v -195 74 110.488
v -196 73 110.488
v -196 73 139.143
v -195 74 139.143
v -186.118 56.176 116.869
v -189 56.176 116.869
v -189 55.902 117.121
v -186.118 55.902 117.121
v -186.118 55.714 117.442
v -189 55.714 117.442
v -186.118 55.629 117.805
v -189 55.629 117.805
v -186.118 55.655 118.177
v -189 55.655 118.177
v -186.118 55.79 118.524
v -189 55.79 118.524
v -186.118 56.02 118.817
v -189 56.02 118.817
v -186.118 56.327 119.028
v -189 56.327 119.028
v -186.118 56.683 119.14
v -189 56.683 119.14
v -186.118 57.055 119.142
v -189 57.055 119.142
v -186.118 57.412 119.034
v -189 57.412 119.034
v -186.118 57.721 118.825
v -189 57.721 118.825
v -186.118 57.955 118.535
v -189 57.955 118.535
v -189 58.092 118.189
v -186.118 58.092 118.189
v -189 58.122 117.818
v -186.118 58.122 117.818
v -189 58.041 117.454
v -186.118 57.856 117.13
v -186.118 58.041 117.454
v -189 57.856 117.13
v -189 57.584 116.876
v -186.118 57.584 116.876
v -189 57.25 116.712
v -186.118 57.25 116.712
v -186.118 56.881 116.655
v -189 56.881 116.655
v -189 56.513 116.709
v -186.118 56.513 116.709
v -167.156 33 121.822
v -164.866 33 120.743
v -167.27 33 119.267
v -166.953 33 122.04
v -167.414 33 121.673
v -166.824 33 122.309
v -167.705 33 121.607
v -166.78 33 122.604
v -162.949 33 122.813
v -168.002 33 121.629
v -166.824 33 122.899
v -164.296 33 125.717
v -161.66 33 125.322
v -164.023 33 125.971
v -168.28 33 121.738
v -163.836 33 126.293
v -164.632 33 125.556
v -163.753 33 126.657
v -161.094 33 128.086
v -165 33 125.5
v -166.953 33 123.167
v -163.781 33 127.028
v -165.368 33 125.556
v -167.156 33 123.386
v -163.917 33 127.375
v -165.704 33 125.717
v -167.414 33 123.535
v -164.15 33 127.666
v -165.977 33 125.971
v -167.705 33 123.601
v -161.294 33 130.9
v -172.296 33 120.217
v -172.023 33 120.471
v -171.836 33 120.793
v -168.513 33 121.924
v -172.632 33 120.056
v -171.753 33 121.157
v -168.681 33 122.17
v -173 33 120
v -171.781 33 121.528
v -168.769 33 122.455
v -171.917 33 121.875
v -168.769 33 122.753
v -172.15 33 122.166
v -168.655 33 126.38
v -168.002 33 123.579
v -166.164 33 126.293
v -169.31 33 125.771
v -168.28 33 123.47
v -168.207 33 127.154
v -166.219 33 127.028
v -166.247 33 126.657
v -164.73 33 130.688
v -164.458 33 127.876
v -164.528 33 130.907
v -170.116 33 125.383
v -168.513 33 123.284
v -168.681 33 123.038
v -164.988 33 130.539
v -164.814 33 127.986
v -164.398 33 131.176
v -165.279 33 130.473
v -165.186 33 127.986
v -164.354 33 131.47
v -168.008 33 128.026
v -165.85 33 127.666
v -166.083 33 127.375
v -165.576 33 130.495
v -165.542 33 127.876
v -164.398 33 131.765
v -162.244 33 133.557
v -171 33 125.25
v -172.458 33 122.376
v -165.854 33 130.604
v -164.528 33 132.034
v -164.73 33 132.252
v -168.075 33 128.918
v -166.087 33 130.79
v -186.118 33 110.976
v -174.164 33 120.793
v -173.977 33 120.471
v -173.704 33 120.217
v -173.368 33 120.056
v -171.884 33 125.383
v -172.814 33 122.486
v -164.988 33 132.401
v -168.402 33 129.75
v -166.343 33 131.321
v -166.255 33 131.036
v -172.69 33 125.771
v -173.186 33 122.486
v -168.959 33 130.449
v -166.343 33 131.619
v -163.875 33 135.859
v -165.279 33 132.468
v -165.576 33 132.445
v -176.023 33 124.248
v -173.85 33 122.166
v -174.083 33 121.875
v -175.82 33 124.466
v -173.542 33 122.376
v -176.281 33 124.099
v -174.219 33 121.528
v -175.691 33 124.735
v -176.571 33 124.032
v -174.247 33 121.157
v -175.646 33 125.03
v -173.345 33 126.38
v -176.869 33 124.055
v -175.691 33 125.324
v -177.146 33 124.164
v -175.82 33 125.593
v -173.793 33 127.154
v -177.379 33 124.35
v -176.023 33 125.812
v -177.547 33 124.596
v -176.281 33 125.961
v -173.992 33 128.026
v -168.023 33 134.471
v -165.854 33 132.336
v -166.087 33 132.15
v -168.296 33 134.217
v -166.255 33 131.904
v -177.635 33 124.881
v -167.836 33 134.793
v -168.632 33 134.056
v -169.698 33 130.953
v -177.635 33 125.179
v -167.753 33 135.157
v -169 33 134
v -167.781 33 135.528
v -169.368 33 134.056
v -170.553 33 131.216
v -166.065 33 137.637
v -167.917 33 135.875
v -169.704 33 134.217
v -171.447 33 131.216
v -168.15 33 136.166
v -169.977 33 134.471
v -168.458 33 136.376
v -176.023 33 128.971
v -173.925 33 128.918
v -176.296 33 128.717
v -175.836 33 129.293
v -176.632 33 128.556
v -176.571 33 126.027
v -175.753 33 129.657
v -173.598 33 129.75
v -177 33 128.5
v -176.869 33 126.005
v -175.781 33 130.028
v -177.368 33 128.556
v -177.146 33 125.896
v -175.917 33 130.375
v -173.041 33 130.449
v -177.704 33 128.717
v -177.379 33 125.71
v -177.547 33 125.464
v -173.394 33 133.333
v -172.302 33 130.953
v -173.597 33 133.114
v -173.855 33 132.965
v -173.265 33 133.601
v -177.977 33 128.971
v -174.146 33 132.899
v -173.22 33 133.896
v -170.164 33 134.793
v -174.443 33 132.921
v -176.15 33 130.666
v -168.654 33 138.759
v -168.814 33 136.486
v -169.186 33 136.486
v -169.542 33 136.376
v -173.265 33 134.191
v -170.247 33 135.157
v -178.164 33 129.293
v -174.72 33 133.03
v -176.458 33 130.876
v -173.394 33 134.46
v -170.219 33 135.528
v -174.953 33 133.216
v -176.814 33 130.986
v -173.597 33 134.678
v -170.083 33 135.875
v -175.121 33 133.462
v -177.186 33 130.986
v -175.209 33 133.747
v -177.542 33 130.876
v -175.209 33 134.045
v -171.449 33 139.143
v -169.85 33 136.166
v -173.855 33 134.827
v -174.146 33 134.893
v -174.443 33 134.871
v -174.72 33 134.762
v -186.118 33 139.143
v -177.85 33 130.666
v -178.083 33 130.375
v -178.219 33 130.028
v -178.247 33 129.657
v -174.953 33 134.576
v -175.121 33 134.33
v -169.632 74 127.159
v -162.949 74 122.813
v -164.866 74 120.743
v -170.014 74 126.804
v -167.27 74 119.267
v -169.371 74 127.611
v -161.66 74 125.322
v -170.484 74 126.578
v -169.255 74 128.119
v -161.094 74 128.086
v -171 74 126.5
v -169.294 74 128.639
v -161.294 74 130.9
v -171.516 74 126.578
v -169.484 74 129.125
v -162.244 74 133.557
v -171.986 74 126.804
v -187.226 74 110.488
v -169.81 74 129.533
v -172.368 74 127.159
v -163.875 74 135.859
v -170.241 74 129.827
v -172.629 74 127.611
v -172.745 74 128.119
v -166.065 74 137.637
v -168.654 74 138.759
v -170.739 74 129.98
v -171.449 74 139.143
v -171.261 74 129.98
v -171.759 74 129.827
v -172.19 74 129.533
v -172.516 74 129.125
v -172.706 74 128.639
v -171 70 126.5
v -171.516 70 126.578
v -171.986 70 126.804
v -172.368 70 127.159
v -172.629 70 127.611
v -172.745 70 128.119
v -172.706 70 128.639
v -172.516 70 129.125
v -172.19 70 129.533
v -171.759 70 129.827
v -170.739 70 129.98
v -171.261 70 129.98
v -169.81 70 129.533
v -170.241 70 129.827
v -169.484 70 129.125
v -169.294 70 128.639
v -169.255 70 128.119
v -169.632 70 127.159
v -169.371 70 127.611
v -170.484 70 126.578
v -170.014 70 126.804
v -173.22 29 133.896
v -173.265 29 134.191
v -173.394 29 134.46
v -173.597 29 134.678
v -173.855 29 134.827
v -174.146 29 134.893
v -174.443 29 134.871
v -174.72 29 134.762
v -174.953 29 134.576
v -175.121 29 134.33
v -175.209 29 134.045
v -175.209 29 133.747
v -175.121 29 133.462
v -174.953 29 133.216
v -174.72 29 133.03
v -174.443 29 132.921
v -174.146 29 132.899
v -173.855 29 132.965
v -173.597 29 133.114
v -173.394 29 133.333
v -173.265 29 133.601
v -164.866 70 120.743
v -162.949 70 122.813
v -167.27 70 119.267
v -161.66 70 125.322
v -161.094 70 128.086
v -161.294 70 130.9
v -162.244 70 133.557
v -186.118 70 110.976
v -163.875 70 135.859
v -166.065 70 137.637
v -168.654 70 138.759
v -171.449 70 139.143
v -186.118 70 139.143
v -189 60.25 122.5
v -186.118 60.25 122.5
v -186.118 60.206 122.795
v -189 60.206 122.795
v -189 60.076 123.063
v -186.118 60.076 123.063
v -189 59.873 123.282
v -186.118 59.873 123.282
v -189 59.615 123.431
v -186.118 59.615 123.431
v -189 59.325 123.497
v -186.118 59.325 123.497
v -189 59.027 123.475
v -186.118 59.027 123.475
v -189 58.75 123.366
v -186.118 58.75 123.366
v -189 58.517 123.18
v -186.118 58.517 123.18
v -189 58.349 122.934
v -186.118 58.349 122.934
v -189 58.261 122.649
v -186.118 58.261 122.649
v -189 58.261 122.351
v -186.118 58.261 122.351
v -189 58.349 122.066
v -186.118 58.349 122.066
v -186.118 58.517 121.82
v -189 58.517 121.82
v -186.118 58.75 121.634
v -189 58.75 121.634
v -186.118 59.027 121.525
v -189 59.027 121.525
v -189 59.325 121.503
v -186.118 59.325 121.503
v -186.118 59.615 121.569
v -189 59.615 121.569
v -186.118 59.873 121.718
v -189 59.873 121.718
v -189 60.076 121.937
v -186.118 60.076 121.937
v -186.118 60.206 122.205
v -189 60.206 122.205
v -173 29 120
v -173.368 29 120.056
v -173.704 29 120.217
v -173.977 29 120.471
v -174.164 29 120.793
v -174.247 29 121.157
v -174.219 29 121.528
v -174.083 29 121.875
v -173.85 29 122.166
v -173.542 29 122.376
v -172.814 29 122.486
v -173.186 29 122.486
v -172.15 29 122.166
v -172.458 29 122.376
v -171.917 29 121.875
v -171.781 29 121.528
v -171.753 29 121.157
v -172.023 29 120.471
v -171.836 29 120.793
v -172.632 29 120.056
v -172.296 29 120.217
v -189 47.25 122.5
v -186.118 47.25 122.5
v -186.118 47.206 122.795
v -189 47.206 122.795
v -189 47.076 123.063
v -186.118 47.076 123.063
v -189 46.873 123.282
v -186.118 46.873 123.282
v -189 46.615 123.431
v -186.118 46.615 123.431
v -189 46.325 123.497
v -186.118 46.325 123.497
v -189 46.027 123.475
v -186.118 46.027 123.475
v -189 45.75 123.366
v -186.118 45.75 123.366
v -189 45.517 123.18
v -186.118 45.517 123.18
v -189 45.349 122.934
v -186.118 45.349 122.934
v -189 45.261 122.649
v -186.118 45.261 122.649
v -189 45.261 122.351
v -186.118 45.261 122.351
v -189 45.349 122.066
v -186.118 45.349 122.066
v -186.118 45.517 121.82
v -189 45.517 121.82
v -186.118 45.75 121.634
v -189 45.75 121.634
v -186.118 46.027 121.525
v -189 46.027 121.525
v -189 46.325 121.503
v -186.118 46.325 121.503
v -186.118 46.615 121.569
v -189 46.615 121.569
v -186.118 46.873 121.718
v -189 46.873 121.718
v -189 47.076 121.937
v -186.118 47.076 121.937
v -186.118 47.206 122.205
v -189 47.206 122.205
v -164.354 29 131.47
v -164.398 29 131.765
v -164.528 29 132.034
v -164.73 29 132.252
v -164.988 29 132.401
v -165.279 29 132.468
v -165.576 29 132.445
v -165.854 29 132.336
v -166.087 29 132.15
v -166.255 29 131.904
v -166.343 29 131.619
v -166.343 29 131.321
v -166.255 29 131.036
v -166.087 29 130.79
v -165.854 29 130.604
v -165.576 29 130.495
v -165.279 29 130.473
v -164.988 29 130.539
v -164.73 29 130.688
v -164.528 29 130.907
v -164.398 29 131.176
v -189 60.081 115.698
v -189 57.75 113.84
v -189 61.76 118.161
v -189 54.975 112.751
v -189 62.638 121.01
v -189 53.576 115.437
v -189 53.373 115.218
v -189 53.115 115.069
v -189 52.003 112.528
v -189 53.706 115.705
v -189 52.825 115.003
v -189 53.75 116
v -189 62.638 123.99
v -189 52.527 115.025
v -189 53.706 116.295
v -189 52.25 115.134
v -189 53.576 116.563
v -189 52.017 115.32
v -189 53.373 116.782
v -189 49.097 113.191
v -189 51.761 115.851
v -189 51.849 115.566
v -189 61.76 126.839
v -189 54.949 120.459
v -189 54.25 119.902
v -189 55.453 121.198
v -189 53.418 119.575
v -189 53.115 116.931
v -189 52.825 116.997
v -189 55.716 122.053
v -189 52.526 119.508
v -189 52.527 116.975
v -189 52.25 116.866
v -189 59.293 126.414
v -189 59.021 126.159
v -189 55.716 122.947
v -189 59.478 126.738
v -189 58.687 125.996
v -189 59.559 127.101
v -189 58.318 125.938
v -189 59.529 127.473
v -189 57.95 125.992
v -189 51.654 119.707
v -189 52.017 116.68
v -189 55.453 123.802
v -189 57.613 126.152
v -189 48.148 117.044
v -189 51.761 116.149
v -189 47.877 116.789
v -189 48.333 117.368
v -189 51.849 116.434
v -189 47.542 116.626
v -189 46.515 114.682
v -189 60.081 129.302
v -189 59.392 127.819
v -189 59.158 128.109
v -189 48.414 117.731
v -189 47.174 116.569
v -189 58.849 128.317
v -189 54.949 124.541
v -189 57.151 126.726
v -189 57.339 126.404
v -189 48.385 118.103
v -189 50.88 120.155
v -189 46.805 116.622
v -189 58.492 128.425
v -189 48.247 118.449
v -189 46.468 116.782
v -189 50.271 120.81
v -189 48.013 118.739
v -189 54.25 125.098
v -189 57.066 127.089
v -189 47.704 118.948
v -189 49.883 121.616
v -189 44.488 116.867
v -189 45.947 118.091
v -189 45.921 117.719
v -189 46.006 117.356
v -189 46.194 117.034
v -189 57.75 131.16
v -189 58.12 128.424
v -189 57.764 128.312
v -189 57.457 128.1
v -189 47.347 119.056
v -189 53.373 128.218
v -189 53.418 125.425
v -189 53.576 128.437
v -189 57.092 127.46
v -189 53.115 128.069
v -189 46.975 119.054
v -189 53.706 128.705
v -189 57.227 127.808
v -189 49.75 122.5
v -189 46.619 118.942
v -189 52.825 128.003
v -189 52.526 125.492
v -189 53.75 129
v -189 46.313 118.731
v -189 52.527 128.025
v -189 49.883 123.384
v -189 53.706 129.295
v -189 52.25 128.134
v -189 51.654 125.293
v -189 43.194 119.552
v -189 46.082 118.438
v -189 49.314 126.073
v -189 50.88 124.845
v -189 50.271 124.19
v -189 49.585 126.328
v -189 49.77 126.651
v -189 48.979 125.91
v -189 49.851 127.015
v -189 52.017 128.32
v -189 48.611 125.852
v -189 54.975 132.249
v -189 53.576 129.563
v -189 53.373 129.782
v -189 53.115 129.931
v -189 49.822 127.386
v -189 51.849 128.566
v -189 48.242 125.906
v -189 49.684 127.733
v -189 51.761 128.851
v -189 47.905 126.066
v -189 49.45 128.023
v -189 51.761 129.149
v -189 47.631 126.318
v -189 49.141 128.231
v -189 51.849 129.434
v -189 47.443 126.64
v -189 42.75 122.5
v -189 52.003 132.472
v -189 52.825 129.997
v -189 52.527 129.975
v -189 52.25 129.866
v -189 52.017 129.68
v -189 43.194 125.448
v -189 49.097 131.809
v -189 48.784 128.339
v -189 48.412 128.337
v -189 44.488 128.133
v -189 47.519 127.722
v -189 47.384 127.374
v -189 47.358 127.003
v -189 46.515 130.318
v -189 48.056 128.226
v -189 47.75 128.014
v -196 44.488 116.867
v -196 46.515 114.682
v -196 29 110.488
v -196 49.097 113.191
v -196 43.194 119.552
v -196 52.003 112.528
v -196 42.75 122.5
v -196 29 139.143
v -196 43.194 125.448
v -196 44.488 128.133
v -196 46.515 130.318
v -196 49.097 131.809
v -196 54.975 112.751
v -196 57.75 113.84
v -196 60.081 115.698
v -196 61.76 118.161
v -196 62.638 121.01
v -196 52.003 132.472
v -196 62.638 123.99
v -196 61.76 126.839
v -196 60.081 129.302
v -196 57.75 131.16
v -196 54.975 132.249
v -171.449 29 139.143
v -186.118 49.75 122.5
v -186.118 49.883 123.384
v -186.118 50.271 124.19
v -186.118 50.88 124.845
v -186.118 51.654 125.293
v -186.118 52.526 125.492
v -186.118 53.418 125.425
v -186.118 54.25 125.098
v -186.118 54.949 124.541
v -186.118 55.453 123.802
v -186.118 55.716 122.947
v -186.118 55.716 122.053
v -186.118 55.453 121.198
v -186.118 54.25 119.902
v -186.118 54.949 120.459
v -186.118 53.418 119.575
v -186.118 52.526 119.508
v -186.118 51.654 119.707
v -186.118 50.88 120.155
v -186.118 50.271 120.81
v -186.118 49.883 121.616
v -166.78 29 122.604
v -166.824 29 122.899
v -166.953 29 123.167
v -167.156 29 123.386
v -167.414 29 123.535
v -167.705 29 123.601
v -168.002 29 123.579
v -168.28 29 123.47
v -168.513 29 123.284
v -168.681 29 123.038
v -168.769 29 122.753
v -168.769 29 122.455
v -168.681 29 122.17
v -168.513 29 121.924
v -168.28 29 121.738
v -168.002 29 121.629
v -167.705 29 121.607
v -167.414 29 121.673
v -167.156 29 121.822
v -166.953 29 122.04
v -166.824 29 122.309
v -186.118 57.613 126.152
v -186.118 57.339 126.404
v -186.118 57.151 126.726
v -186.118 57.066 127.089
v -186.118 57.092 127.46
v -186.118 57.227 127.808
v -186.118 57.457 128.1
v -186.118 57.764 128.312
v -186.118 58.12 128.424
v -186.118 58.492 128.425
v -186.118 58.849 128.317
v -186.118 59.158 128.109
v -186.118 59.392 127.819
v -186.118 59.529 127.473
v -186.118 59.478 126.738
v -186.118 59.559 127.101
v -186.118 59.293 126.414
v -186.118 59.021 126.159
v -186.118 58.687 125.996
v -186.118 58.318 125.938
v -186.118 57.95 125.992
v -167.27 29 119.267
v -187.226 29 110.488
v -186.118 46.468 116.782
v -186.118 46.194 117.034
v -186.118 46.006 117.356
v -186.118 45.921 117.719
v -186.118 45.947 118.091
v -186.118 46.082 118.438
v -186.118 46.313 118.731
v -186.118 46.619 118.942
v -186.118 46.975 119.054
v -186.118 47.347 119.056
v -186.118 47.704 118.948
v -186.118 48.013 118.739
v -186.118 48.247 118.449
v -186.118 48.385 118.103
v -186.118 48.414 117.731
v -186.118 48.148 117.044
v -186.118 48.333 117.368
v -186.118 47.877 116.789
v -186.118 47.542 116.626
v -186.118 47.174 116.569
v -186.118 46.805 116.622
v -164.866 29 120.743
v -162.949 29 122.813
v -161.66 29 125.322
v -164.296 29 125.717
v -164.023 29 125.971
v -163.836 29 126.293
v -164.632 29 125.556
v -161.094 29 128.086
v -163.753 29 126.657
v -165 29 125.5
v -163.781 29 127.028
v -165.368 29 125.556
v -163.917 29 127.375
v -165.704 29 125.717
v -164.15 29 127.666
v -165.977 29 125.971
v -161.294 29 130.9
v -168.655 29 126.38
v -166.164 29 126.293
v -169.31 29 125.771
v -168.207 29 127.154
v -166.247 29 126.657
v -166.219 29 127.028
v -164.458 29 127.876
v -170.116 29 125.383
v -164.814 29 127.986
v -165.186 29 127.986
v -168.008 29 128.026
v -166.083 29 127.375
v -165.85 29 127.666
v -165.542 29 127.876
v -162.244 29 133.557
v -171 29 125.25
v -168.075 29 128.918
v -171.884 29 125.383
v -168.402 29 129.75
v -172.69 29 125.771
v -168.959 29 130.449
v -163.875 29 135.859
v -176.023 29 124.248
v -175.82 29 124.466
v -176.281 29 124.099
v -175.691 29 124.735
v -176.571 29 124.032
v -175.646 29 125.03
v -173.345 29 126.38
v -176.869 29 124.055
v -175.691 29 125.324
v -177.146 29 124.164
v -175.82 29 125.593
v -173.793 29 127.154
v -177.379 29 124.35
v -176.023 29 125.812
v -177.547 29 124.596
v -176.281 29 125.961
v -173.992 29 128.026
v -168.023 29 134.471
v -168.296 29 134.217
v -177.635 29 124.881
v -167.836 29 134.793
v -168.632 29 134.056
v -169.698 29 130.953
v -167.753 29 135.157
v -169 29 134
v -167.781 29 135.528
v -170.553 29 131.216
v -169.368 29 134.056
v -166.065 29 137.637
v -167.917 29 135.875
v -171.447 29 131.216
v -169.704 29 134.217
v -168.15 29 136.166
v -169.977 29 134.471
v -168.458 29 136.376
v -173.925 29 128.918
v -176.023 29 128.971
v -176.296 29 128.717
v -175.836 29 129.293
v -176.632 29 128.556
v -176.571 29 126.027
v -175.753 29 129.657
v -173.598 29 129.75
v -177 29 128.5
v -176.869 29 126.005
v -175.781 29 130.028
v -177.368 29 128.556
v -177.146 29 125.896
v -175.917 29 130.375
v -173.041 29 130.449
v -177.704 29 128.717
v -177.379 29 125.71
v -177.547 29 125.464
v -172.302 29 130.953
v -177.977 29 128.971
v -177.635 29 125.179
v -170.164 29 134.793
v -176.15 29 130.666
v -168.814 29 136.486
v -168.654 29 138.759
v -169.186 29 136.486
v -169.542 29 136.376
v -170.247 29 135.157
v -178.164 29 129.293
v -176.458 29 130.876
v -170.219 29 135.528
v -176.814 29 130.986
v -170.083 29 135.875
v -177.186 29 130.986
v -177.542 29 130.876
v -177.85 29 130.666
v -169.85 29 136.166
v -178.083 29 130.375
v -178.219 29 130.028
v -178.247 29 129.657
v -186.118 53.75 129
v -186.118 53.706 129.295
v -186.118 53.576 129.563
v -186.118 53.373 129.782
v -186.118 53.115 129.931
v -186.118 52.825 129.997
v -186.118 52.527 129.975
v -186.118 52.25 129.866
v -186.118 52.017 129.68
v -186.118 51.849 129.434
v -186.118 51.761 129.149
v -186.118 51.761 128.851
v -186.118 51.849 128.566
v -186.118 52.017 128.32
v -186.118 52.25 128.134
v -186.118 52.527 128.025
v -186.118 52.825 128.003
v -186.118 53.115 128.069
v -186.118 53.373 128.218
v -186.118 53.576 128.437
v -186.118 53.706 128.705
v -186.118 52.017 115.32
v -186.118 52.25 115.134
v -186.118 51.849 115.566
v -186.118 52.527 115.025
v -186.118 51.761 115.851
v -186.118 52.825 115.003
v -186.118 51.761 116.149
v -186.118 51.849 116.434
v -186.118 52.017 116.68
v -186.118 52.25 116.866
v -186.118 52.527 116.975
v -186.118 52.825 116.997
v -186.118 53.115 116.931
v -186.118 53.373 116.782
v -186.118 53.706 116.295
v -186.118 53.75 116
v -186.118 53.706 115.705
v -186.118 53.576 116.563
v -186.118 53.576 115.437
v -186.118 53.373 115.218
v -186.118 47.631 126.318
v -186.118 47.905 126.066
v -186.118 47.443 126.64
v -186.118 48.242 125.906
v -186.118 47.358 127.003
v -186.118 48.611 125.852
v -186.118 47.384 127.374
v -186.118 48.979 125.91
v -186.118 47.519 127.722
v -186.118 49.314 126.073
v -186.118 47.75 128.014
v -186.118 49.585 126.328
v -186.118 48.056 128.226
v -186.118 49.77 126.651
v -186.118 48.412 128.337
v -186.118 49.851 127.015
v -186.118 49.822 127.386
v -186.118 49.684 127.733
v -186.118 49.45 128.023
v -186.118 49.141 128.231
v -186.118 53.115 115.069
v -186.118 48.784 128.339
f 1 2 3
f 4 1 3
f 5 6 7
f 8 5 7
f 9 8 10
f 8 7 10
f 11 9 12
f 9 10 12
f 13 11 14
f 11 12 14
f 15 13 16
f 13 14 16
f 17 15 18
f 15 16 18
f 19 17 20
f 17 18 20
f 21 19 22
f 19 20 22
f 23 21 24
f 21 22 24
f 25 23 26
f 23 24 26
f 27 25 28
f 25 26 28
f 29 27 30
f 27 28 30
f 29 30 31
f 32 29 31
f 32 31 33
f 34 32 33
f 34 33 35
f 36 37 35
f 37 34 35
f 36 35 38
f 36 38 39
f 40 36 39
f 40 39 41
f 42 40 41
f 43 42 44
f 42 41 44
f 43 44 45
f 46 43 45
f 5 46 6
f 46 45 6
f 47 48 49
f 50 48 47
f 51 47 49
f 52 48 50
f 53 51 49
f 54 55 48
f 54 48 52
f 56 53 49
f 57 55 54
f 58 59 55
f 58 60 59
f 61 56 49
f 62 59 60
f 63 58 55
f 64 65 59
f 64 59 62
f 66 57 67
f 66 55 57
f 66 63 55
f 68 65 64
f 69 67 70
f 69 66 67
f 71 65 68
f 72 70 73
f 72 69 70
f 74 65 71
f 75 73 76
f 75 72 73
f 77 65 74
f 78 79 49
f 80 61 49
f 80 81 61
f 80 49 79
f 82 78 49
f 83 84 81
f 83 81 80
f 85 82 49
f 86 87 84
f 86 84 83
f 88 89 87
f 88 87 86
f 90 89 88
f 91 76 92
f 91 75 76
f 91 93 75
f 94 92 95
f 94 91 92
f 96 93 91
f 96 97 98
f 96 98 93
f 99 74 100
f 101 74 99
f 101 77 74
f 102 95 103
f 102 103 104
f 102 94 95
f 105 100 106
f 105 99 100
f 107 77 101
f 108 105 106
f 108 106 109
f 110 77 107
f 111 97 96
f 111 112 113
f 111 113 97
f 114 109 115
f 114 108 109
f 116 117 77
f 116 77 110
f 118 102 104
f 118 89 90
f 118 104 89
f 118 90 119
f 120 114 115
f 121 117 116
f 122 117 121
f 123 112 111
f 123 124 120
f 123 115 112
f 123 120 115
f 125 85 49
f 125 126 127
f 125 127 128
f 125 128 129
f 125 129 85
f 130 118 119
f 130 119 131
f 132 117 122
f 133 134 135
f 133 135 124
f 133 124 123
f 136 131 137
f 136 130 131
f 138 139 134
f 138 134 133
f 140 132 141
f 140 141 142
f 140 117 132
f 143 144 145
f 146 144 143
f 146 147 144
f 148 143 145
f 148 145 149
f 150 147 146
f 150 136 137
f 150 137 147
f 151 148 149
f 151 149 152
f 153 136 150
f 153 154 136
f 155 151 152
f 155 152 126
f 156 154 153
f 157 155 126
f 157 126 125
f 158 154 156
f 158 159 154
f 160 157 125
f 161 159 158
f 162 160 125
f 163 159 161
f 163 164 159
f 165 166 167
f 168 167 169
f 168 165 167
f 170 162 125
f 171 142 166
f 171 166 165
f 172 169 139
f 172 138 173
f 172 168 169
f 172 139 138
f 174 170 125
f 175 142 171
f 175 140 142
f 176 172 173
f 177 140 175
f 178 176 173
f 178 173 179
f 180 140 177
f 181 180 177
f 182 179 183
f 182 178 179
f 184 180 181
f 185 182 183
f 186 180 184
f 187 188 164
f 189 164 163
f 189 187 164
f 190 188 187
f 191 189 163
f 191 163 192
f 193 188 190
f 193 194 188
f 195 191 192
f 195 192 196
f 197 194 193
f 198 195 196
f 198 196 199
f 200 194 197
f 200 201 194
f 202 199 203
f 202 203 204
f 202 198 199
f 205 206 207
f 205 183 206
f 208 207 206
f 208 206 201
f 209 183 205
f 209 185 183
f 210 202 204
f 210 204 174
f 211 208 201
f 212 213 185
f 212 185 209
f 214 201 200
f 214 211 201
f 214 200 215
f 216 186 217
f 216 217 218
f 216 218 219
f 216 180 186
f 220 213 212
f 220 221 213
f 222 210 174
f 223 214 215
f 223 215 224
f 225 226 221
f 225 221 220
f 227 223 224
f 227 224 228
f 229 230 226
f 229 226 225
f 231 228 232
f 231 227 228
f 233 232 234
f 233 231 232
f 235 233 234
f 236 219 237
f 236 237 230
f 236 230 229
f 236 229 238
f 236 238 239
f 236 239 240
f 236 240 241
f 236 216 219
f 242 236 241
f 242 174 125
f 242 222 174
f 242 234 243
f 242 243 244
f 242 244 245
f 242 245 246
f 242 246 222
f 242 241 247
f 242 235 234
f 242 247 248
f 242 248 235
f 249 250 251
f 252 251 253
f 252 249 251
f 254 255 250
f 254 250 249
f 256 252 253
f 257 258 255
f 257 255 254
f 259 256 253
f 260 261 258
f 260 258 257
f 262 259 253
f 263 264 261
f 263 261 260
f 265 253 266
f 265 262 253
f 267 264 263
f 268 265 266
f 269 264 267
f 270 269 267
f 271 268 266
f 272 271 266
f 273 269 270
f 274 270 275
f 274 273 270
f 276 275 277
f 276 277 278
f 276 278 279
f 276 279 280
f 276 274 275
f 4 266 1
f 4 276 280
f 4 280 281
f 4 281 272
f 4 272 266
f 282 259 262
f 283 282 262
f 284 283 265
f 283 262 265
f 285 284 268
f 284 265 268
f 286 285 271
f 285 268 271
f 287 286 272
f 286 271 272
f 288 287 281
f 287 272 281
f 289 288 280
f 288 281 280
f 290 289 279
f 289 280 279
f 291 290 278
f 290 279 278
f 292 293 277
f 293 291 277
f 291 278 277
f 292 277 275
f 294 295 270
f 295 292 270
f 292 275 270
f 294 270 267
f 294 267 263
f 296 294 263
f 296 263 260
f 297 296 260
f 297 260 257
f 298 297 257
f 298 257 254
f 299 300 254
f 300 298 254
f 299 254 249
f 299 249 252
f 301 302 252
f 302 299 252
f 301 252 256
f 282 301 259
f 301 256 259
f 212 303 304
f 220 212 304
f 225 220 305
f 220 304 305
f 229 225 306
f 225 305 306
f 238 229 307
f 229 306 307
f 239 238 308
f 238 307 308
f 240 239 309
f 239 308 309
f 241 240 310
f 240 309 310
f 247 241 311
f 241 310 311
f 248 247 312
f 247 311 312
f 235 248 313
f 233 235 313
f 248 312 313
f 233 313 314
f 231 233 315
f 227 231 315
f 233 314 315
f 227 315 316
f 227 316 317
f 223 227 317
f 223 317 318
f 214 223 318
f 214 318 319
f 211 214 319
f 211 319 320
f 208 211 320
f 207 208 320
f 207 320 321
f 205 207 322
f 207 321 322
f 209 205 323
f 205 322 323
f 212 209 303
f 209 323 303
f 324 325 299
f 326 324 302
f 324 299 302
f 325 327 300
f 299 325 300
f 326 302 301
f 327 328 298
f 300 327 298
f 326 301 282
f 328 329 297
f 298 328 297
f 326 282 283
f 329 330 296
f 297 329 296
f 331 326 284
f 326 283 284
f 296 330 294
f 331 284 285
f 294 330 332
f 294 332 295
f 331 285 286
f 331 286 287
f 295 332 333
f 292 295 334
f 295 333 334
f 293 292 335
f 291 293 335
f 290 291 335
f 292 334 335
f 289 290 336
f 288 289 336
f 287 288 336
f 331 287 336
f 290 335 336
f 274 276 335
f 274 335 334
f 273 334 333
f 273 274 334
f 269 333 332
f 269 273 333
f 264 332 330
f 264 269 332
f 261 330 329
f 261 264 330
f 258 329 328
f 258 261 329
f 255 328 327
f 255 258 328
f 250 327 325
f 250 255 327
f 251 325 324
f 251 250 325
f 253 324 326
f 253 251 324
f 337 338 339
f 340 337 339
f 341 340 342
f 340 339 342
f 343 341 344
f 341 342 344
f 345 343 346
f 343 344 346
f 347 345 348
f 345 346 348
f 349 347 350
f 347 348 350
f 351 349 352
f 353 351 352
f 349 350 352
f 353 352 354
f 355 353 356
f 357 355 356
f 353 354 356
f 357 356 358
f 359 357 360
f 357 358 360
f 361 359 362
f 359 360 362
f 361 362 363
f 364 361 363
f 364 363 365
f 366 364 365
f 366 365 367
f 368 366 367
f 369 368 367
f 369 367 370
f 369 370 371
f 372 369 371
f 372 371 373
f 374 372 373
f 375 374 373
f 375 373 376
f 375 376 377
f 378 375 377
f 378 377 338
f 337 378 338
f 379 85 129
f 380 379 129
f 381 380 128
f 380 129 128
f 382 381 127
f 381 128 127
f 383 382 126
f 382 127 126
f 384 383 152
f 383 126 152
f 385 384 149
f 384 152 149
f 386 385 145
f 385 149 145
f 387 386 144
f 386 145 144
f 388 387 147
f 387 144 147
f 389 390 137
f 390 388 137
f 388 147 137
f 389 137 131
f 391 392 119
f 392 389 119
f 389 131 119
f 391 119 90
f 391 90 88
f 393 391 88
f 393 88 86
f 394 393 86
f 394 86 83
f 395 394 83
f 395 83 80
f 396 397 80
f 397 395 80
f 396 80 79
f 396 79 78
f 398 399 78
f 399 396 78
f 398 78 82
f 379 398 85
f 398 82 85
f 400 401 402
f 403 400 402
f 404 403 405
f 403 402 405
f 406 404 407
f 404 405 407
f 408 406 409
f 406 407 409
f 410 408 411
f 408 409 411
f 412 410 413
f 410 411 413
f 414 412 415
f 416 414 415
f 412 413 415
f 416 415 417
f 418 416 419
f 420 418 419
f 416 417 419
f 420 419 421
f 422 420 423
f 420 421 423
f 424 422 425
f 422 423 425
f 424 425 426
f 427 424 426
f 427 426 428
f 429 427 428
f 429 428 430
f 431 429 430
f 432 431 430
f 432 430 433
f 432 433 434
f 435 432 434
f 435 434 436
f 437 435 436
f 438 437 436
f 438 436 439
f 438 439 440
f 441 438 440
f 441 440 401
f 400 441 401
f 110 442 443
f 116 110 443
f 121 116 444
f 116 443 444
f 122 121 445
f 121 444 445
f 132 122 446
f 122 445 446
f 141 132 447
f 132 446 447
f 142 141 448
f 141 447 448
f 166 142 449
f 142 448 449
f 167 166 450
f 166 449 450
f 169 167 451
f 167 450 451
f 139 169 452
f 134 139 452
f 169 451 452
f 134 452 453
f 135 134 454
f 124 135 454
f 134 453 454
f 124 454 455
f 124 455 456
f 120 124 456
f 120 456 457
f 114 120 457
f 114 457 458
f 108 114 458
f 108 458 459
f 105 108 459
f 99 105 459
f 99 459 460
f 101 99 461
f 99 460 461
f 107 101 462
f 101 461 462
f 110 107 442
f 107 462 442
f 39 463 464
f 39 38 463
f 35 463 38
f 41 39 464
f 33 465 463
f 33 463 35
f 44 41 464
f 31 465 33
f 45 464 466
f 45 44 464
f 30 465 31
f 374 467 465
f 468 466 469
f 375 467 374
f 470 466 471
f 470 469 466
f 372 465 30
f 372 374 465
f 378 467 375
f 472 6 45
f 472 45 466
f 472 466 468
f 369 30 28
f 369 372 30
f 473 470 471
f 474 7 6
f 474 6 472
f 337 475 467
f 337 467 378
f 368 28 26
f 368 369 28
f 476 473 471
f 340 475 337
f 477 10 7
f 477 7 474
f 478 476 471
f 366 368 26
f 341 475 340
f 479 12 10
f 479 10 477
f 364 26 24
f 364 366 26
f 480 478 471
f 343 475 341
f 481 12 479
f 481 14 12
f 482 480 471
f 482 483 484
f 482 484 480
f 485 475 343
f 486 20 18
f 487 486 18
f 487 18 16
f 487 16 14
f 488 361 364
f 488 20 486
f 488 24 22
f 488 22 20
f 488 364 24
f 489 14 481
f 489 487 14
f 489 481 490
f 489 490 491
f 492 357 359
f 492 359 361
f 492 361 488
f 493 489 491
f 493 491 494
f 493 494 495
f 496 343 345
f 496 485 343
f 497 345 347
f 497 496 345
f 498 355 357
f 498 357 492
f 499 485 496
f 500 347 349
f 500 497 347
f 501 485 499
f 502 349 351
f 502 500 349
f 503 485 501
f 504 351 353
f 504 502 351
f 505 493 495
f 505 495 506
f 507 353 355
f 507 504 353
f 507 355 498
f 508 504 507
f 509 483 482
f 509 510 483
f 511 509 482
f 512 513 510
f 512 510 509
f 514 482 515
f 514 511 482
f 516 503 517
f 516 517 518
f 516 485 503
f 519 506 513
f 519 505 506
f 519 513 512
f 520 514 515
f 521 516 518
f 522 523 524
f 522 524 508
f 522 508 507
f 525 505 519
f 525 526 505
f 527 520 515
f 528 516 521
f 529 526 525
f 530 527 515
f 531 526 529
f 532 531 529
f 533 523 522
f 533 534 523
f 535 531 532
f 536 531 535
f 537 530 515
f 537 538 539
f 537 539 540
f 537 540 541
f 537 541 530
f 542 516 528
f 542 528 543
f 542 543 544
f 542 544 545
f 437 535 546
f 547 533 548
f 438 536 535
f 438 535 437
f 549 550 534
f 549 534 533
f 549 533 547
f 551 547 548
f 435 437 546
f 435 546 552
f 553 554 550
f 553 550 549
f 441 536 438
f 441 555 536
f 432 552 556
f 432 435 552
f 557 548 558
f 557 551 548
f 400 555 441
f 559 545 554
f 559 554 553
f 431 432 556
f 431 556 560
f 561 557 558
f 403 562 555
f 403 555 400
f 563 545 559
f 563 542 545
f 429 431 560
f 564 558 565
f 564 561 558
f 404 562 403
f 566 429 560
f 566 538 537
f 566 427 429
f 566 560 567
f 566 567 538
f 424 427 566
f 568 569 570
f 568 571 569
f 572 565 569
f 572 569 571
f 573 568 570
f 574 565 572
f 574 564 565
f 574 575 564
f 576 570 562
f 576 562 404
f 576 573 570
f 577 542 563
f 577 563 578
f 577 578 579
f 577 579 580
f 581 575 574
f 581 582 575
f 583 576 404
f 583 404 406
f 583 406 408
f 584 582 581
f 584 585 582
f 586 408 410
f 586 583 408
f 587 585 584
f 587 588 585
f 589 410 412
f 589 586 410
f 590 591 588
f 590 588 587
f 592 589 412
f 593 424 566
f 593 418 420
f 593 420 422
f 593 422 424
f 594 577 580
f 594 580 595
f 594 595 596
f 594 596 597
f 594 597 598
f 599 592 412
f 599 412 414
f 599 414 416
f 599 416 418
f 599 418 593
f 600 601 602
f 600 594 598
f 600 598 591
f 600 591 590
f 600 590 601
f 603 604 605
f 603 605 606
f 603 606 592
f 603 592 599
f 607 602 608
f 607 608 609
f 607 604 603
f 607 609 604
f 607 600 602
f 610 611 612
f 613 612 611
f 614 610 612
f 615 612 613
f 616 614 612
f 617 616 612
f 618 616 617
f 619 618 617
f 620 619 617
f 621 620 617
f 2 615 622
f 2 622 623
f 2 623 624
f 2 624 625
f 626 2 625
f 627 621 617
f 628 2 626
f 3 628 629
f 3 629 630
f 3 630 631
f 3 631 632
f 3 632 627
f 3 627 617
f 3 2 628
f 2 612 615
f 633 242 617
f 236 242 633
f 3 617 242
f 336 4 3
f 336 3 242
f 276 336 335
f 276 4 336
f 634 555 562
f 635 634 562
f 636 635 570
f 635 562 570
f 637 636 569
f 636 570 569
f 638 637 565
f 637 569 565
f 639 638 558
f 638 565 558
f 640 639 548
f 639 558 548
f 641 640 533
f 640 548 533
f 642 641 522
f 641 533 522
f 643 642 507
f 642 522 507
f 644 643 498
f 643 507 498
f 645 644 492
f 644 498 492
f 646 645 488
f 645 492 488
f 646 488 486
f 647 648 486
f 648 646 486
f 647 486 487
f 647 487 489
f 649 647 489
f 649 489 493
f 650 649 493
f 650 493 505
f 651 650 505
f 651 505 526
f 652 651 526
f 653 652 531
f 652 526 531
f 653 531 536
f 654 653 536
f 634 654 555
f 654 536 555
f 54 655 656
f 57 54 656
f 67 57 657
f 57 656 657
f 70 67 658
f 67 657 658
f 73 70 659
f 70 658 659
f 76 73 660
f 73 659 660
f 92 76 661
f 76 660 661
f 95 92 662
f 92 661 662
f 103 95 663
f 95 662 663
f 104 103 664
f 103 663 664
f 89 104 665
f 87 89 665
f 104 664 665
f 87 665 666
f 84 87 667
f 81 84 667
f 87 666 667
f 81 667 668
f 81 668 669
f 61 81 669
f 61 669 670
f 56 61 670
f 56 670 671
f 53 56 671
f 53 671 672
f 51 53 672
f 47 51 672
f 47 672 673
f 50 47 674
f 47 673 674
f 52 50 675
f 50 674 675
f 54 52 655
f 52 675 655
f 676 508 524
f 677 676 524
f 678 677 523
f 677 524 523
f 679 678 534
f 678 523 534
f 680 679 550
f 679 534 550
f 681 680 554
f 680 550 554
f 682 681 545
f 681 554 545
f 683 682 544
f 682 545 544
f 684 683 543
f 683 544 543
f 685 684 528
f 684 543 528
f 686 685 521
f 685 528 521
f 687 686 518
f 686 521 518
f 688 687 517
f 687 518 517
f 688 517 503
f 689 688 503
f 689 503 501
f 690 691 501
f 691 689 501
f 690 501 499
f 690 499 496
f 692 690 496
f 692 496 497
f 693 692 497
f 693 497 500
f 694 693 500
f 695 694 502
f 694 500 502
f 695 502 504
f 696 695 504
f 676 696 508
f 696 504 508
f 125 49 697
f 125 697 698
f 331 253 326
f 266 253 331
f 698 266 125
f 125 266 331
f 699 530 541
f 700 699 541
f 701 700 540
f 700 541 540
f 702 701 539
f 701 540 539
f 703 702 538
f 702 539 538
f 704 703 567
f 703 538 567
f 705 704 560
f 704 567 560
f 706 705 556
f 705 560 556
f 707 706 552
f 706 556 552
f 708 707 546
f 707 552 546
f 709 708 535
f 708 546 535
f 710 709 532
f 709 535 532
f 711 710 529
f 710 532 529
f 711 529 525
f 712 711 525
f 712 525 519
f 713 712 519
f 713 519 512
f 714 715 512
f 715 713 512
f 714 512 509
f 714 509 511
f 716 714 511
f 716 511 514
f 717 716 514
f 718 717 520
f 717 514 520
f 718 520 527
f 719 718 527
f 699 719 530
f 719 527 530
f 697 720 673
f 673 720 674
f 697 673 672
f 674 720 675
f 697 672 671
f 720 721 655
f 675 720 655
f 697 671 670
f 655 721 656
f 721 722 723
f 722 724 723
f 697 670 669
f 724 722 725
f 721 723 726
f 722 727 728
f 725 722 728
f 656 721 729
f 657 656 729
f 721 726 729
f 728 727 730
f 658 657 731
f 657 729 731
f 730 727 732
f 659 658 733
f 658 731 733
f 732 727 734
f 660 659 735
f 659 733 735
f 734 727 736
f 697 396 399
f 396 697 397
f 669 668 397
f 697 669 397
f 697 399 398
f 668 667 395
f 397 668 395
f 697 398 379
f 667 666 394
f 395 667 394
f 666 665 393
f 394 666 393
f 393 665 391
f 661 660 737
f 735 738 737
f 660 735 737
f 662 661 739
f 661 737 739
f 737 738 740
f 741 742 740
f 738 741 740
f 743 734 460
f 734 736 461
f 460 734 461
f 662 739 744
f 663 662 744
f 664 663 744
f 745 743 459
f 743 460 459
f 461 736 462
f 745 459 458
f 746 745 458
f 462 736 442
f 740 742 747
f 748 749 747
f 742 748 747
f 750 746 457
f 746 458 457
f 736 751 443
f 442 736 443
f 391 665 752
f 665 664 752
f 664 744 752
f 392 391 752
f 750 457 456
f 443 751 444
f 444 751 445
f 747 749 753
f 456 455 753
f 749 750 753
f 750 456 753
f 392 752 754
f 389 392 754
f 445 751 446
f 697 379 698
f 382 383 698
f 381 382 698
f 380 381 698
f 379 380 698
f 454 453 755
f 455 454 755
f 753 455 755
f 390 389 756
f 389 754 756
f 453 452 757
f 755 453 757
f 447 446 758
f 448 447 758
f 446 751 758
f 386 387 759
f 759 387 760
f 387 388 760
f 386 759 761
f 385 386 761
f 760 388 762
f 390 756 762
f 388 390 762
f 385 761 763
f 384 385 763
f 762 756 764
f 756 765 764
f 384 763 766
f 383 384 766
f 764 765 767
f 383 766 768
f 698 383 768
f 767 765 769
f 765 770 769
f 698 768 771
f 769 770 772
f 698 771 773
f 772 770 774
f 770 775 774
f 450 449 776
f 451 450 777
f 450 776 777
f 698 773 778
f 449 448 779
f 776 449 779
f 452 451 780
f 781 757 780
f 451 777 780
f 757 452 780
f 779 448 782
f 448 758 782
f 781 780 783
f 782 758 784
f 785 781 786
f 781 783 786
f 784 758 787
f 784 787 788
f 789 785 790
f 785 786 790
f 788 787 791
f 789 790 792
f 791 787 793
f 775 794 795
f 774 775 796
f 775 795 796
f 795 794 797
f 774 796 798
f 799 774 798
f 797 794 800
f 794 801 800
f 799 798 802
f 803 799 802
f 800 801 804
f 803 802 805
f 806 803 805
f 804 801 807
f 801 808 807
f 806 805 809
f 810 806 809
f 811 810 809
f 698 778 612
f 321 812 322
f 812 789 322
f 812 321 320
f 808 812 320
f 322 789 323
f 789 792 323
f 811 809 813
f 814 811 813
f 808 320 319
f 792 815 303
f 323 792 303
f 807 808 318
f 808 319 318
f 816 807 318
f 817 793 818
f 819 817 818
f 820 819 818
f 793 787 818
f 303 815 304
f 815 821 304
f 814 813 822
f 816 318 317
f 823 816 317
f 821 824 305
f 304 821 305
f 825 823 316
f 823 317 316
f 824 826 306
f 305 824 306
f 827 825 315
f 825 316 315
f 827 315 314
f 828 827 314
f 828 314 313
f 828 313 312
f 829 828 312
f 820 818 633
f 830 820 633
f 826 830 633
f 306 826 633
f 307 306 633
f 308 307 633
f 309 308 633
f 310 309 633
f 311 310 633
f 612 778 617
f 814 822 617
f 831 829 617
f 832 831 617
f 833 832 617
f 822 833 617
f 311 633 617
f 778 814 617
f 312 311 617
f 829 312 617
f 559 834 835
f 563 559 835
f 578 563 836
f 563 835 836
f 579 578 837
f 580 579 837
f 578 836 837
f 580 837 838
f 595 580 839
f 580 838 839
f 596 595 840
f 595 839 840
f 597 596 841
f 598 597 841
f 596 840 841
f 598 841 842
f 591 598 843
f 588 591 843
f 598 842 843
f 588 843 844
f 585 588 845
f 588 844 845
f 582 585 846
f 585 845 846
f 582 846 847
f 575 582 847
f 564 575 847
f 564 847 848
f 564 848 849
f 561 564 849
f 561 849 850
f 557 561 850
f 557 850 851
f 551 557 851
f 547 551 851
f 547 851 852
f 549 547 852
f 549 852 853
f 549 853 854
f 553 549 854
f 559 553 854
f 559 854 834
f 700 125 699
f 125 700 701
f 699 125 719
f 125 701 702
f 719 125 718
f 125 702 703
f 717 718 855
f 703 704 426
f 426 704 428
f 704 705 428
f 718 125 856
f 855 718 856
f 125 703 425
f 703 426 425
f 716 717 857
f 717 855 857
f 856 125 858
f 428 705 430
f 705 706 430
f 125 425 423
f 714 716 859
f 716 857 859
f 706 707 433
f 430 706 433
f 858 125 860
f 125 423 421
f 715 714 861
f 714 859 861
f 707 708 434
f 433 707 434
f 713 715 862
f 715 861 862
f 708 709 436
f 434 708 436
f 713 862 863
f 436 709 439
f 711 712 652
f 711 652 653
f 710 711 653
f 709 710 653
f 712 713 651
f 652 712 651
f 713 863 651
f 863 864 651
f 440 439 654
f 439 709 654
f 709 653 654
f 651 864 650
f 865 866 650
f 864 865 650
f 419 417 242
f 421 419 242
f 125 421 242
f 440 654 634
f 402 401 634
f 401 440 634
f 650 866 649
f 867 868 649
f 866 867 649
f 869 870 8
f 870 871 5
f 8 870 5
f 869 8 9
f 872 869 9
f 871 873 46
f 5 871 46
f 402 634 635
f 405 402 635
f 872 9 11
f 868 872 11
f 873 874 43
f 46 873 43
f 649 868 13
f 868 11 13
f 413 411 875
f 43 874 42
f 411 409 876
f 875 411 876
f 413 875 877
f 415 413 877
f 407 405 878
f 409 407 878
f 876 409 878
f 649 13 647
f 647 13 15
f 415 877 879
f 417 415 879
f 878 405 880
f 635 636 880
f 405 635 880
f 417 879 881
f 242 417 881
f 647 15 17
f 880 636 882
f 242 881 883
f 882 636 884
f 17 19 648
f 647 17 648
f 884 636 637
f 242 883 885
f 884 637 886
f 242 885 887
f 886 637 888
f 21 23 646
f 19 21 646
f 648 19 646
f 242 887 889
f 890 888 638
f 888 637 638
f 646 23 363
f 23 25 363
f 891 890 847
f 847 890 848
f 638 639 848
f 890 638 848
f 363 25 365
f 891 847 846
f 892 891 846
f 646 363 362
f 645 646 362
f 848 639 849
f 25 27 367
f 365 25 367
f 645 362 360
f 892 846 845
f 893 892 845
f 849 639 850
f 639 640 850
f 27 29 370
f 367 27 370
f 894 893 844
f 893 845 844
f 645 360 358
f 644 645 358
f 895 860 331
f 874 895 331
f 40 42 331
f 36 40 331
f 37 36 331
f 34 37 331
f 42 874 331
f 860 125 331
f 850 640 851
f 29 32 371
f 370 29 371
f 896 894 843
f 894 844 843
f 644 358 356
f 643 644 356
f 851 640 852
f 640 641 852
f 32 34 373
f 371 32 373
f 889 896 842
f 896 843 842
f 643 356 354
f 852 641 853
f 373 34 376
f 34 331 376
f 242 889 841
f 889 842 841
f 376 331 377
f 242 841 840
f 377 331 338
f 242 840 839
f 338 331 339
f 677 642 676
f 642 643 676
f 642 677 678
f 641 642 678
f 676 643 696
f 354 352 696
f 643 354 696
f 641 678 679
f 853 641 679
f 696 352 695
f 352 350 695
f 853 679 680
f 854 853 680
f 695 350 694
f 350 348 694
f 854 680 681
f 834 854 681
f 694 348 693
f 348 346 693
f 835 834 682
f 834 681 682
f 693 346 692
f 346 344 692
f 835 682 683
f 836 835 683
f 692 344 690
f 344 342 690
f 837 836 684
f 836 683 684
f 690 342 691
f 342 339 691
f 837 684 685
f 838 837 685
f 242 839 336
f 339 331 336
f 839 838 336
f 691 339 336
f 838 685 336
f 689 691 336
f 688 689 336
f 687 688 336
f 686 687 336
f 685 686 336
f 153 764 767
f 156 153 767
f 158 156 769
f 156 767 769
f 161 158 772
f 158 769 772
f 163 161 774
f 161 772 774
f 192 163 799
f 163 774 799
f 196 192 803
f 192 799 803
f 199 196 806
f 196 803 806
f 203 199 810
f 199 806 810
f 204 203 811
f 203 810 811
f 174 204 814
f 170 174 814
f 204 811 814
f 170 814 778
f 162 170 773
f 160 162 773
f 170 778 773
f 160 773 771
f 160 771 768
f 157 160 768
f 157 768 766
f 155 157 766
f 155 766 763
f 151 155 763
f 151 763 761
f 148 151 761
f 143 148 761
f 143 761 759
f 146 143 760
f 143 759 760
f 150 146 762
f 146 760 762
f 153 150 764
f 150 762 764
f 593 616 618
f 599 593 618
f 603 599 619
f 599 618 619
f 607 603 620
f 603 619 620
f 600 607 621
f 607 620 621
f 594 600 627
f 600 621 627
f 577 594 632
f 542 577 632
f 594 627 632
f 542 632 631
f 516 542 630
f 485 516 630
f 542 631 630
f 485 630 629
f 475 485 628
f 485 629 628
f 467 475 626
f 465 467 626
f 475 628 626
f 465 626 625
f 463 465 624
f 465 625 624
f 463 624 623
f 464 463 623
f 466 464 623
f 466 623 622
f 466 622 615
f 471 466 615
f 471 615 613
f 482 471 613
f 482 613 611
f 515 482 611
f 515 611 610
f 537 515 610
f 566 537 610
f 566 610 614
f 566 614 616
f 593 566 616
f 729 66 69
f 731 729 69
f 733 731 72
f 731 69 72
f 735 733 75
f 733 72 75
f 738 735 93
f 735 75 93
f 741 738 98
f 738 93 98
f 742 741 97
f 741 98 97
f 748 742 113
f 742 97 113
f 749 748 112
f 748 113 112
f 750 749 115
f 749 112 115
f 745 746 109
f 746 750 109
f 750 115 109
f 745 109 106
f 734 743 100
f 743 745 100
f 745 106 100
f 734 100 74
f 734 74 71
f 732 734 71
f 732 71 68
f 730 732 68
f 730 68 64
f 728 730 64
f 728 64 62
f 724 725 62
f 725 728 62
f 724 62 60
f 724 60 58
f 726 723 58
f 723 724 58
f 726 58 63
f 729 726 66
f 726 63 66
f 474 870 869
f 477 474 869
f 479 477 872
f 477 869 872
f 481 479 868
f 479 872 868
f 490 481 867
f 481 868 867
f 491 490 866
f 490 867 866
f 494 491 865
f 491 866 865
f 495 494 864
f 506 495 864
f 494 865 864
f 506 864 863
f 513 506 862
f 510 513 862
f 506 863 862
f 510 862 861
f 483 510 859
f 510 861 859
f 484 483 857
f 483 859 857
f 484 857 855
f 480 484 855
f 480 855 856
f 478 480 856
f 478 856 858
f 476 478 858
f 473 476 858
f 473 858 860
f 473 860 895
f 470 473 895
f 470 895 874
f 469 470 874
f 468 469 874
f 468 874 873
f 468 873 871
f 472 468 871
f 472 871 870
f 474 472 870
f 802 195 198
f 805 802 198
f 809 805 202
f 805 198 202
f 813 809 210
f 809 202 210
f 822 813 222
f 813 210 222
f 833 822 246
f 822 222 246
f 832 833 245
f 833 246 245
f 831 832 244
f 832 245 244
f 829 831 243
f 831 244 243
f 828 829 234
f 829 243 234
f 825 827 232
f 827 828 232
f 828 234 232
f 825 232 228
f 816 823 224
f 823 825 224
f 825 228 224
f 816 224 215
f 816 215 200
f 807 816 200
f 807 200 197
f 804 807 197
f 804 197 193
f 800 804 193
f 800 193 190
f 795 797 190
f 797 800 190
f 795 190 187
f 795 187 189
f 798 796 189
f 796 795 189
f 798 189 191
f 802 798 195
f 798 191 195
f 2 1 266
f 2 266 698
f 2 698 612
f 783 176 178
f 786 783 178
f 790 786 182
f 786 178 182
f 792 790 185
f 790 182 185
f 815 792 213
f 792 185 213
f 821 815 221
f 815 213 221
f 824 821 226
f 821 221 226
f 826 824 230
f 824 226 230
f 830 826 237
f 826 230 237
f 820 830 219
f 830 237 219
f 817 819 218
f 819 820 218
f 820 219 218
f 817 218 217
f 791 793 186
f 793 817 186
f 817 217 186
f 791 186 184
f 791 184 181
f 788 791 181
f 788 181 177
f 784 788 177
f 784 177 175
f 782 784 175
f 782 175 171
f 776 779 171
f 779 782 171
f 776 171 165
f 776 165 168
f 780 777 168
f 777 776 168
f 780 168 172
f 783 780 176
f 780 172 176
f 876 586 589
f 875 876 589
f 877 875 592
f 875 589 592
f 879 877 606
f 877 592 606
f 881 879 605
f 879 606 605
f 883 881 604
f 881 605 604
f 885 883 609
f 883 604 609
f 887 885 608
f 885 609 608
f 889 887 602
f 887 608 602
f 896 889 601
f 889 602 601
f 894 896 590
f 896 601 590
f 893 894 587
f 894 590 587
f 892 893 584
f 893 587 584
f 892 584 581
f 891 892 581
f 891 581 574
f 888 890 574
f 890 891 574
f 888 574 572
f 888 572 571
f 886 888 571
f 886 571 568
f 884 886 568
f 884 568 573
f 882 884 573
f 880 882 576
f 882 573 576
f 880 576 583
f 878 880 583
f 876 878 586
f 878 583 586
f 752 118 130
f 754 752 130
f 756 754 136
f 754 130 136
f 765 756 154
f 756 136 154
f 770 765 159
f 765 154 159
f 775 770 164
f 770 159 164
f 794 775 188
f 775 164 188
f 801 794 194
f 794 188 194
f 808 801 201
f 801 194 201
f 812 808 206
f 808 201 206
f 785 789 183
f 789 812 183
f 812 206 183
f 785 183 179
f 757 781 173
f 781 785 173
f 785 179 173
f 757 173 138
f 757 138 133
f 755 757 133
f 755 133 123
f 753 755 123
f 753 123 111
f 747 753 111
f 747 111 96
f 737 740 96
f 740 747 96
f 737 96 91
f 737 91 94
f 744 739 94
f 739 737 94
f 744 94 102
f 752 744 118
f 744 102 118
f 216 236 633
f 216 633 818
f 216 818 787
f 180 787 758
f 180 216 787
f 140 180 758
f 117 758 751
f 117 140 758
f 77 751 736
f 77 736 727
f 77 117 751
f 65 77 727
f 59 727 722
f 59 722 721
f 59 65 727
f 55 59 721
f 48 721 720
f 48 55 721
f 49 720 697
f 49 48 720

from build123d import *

# Parameters (mm, degrees)
CYLINDER067_R                        = 1.75
CYLINDER067_DEPTH                    = 22
CYLINDER067_PITCH_ANGLE              = 90
CYLINDER061_R                        = 1.25
CYLINDER061_DEPTH                    = 22
CYLINDER061_PITCH_ANGLE              = 90
CYLINDER062_R                        = 1.25
CYLINDER062_DEPTH                    = 22
CYLINDER062_PITCH_ANGLE              = 90
CYLINDER060_R                        = 1.25
CYLINDER060_DEPTH                    = 22
CYLINDER060_PITCH_ANGLE              = 90
CYLINDER059_R                        = 1.25
CYLINDER059_DEPTH                    = 22
CYLINDER059_PITCH_ANGLE              = 90
CYLINDER065_R                        = 1.25
CYLINDER065_DEPTH                    = 22
CYLINDER065_PITCH_ANGLE              = 90
CYLINDER066_R                        = 1.25
CYLINDER066_DEPTH                    = 22
CYLINDER066_PITCH_ANGLE              = 90
CYLINDER064_R                        = 1.25
CYLINDER064_DEPTH                    = 22
CYLINDER064_PITCH_ANGLE              = 90
CYLINDER063_R                        = 1.25
CYLINDER063_DEPTH                    = 22
CYLINDER063_PITCH_ANGLE              = 90
FUSION047_ROLL_ANGLE                 = 34
FUSION047_PLACEMENT_ANGLE            = -90
CYLINDER058_R                        = 3
CYLINDER058_DEPTH                    = 22
CYLINDER058_PITCH_ANGLE              = 90
CYLINDER057_R                        = 3
CYLINDER057_DEPTH                    = 13
CYLINDER057_ROLL_ANGLE               = 90
CYLINDER056_R                        = 10
CYLINDER056_DEPTH                    = 10
CYLINDER056_ROLL_ANGLE               = 90
PAD007_DEPTH                         = 34
PAD005_DEPTH                         = 42
CHAMFER104_SIZE                      = 1
CLONE020_PLACEMENT_ANGLE             = -90
PART_MIRRORING007012_PLACEMENT_ANGLE = 180
BOX071_W                             = 47
BOX071_H                             = 42
BOX071_DEPTH                         = 35
BOX072_W                             = 47
BOX072_H                             = 42
BOX072_DEPTH                         = 35
SKETCH022_R                          = 1
POCKET018_DEPTH                      = 3
SKETCH023_R                          = 1
POCKET019_DEPTH                      = 4


with BuildPart() as cilindro011:
    # Cylinder067 → Cylinder067 (new body)
    with BuildSketch(Plane.XY):
        Circle(CYLINDER067_R)
    extrude(amount=CYLINDER067_DEPTH)


with BuildPart() as cilindro011_1:
    # Cylinder067 pitch: moved
    add(cilindro011.part.rotate(Axis((0, 0, 0), (0, 1, 0)), CYLINDER067_PITCH_ANGLE))


with BuildPart() as cilindro011_2:
    # Cylinder067 placement: moved
    add(cilindro011_1.part.moved(Location((-4.75, -32, 125.75))))


with BuildPart() as cilindro005:
    # Cylinder061 → Cylinder061 (new body)
    with BuildSketch(Plane.XY):
        Circle(CYLINDER061_R)
    extrude(amount=CYLINDER061_DEPTH)


with BuildPart() as cilindro005_1:
    # Cylinder061 pitch: moved
    add(cilindro005.part.rotate(Axis((0, 0, 0), (0, 1, 0)), CYLINDER061_PITCH_ANGLE))


with BuildPart() as cilindro005_2:
    # Cylinder061 placement: moved
    add(cilindro005_1.part.moved(Location((20.25, -38, 124.25))))


with BuildPart() as cilindro006:
    # Cylinder062 → Cylinder062 (new body)
    with BuildSketch(Plane.XY):
        Circle(CYLINDER062_R)
    extrude(amount=CYLINDER062_DEPTH)


with BuildPart() as cilindro006_1:
    # Cylinder062 pitch: moved
    add(cilindro006.part.rotate(Axis((0, 0, 0), (0, 1, 0)), CYLINDER062_PITCH_ANGLE))


with BuildPart() as cilindro006_2:
    # Cylinder062 placement: moved
    add(cilindro006_1.part.moved(Location((20.25, -26, 127.25))))


with BuildPart() as cilindro004:
    # Cylinder060 → Cylinder060 (new body)
    with BuildSketch(Plane.XY):
        Circle(CYLINDER060_R)
    extrude(amount=CYLINDER060_DEPTH)


with BuildPart() as cilindro004_1:
    # Cylinder060 pitch: moved
    add(cilindro004.part.rotate(Axis((0, 0, 0), (0, 1, 0)), CYLINDER060_PITCH_ANGLE))


with BuildPart() as cilindro004_2:
    # Cylinder060 placement: moved
    add(cilindro004_1.part.moved(Location((20.25, -30, 118.75))))


with BuildPart() as fusion046:
    # Cylinder059 → Cylinder059 (new body)
    with BuildSketch(Plane.XY):
        Circle(CYLINDER059_R)
    extrude(amount=CYLINDER059_DEPTH)


with BuildPart() as fusion046_1:
    # Cylinder059 pitch: moved
    add(fusion046.part.rotate(Axis((0, 0, 0), (0, 1, 0)), CYLINDER059_PITCH_ANGLE))


with BuildPart() as fusion046_2:
    # Cylinder059 placement: moved
    add(fusion046_1.part.moved(Location((20.25, -34, 132.75))))

    # Fusion046: union Cilindro005, Cilindro006, Cilindro004
    add(cilindro005_2.part)
    add(cilindro006_2.part)
    add(cilindro004_2.part)


with BuildPart() as cilindro009:
    # Cylinder065 → Cylinder065 (new body)
    with BuildSketch(Plane.XY):
        Circle(CYLINDER065_R)
    extrude(amount=CYLINDER065_DEPTH)


with BuildPart() as cilindro009_1:
    # Cylinder065 pitch: moved
    add(cilindro009.part.rotate(Axis((0, 0, 0), (0, 1, 0)), CYLINDER065_PITCH_ANGLE))


with BuildPart() as cilindro009_2:
    # Cylinder065 placement: moved
    add(cilindro009_1.part.moved(Location((20.25, -38, 124.25))))


with BuildPart() as cilindro010:
    # Cylinder066 → Cylinder066 (new body)
    with BuildSketch(Plane.XY):
        Circle(CYLINDER066_R)
    extrude(amount=CYLINDER066_DEPTH)


with BuildPart() as cilindro010_1:
    # Cylinder066 pitch: moved
    add(cilindro010.part.rotate(Axis((0, 0, 0), (0, 1, 0)), CYLINDER066_PITCH_ANGLE))


with BuildPart() as cilindro010_2:
    # Cylinder066 placement: moved
    add(cilindro010_1.part.moved(Location((20.25, -26, 127.25))))


with BuildPart() as cilindro008:
    # Cylinder064 → Cylinder064 (new body)
    with BuildSketch(Plane.XY):
        Circle(CYLINDER064_R)
    extrude(amount=CYLINDER064_DEPTH)


with BuildPart() as cilindro008_1:
    # Cylinder064 pitch: moved
    add(cilindro008.part.rotate(Axis((0, 0, 0), (0, 1, 0)), CYLINDER064_PITCH_ANGLE))


with BuildPart() as cilindro008_2:
    # Cylinder064 placement: moved
    add(cilindro008_1.part.moved(Location((20.25, -30, 118.75))))


with BuildPart() as fusion047:
    # Cylinder063 → Cylinder063 (new body)
    with BuildSketch(Plane.XY):
        Circle(CYLINDER063_R)
    extrude(amount=CYLINDER063_DEPTH)


with BuildPart() as fusion047_1:
    # Cylinder063 pitch: moved
    add(fusion047.part.rotate(Axis((0, 0, 0), (0, 1, 0)), CYLINDER063_PITCH_ANGLE))


with BuildPart() as fusion047_2:
    # Cylinder063 placement: moved
    add(fusion047_1.part.moved(Location((20.25, -34, 132.75))))

    # Fusion047: union Cilindro009, Cilindro010, Cilindro008
    add(cilindro009_2.part)
    add(cilindro010_2.part)
    add(cilindro008_2.part)


with BuildPart() as fusion047_3:
    # Fusion047 roll: moved
    add(fusion047_2.part.rotate(Axis((0, 0, 0), (1, 0, 0)), FUSION047_ROLL_ANGLE))


with BuildPart() as fusion047_4:
    # Fusion047 placement: moved
    add(fusion047_3.part.moved(Location((114.107998, 21, 33.646227))).rotate(Axis((114.107998, 21, 33.646227), (0, 0, 1)), FUSION047_PLACEMENT_ANGLE))


with BuildPart() as cilindro002:
    # Cylinder058 → Cylinder058 (new body)
    with BuildSketch(Plane.XY):
        Circle(CYLINDER058_R)
    extrude(amount=CYLINDER058_DEPTH)


with BuildPart() as cilindro002_1:
    # Cylinder058 pitch: moved
    add(cilindro002.part.rotate(Axis((0, 0, 0), (0, 1, 0)), CYLINDER058_PITCH_ANGLE))


with BuildPart() as cilindro002_2:
    # Cylinder058 placement: moved
    add(cilindro002_1.part.moved(Location((20.25, -32, 125.75))))


with BuildPart() as cilindro001:
    # Cylinder057 → Cylinder057 (new body)
    with BuildSketch(Plane.XY):
        Circle(CYLINDER057_R)
    extrude(amount=CYLINDER057_DEPTH)


with BuildPart() as cilindro001_1:
    # Cylinder057 roll: moved
    add(cilindro001.part.rotate(Axis((0, 0, 0), (1, 0, 0)), CYLINDER057_ROLL_ANGLE))


with BuildPart() as cilindro001_2:
    # Cylinder057 placement: moved
    add(cilindro001_1.part.moved(Location((17.25, -6, 120))))


with BuildPart() as cilindro:
    # Cylinder056 → Cylinder056 (new body)
    with BuildSketch(Plane.XY):
        Circle(CYLINDER056_R)
    extrude(amount=CYLINDER056_DEPTH)


with BuildPart() as cilindro_1:
    # Cylinder056 roll: moved
    add(cilindro.part.rotate(Axis((0, 0, 0), (1, 0, 0)), CYLINDER056_ROLL_ANGLE))


with BuildPart() as cilindro_2:
    # Cylinder056 placement: moved
    add(cilindro_1.part.moved(Location((17.25, -4, 120))))


with BuildPart() as pad007:
    # Sketch012 → Pad007 (new body)
    with BuildSketch(Plane(origin=(3, -12, -1), x_dir=(0, 1, 0), z_dir=(1, 0, 0))):
        Polygon((-4.882067, 101.940956), (-4.882067, 138.559921), (-40.571098, 142.373672), (-40.571098, 120.688431), align=None)
    extrude(amount=PAD007_DEPTH)


with BuildPart() as right_shoulder:
    # Sketch010 → Pad005 (new body)
    with BuildSketch(Plane.YZ.offset(-1)):
        with BuildLine():
            Line((-35.729516, 116.76657), (-15.773906, 107.988197))
            Line((-15.773906, 107.988197), (-7.000344, 107.988197))
            Line((-7.000344, 107.988197), (-7.000344, 136.642965))
            Line((-7.000344, 136.642965), (-31.550963, 136.642965))
            ThreePointArc((-31.550963, 136.642965), (-41.706398, 128.400491), (-35.729516, 116.76657))
        make_face()
    extrude(amount=PAD005_DEPTH)

    # Cut085: cut Pad007
    add(pad007.part, mode=Mode.SUBTRACT)

    # Cut086: cut Cilindro
    add(cilindro_2.part, mode=Mode.SUBTRACT)

    # Cut087: cut Cilindro001
    add(cilindro001_2.part, mode=Mode.SUBTRACT)

    # Chamfer104
    chamfer104_edges = [right_shoulder.edges().sort_by_distance(p)[0] for p in [
        (-1, -7.000344, 122.315581),
    ]]
    chamfer(chamfer104_edges, length=CHAMFER104_SIZE)

    # Cut088: cut Cilindro002
    add(cilindro002_2.part, mode=Mode.SUBTRACT)

    # Cut089: cut Fusion047
    add(fusion047_4.part, mode=Mode.SUBTRACT)

    # Cut090: cut Fusion046
    add(fusion046_2.part, mode=Mode.SUBTRACT)

    # Cut091: cut Cilindro011
    add(cilindro011_2.part, mode=Mode.SUBTRACT)


with BuildPart() as right_shoulder_1:
    # Clone020 placement: moved
    add(right_shoulder.part.moved(Location((-275, 70, 2.5))).rotate(Axis((-275, 70, 2.5), (0, 0, 1)), CLONE020_PLACEMENT_ANGLE))


with BuildPart() as left_shoulder:
    # Part__Mirroring007012: instance of right-shoulder
    add(right_shoulder_1.part.mirror(Plane(origin=(0, 0, 0), x_dir=(1, 0, 0), z_dir=(0, 1, 0))))


with BuildPart() as left_shoulder_1:
    # Part__Mirroring007012 placement: moved
    add(left_shoulder.part.moved(Location((-478, 0, 0))).rotate(Axis((-478, 0, 0), (0, 0, 1)), PART_MIRRORING007012_PLACEMENT_ANGLE))


with BuildPart() as clone_of_left_shoulder001:
    # Clone029 base: copy of left-shoulder
    add(left_shoulder_1.part)


with BuildPart() as clone_of_left_shoulder001_1:
    # Clone029 placement: moved
    add(clone_of_left_shoulder001.part.moved(Location((0, 3, 0))))


with BuildPart() as common:
    # Box071 → Box071 (new body)
    with BuildSketch(Plane(origin=(-205.102, 65.2498, 108.143), x_dir=(1, 0, 0), z_dir=(0, 0, 1))):
        with Locations((23.5, 21)):
            Rectangle(BOX071_W, BOX071_H)
    extrude(amount=BOX071_DEPTH)

    # Common: intersect Clone of left-shoulder001
    add(clone_of_left_shoulder001_1.part, mode=Mode.INTERSECT)


with BuildPart() as clone_of_left_shoulder:
    # Clone028 base: copy of left-shoulder
    add(left_shoulder_1.part)


with BuildPart() as leftshoulder_large_more_holes:
    # Box072 → Box072 (new body)
    with BuildSketch(Plane(origin=(-205.102, 24.2498, 108.143), x_dir=(1, 0, 0), z_dir=(0, 0, 1))):
        with Locations((23.5, 21)):
            Rectangle(BOX072_W, BOX072_H)
    extrude(amount=BOX072_DEPTH)

    # Common001: intersect Clone of left-shoulder
    add(clone_of_left_shoulder.part, mode=Mode.INTERSECT)

    # Fusion067: union Common
    add(common.part)

    # Sketch022 → Pocket018 (cut)
    with BuildSketch(Plane.YZ.offset(-186.117933)):
        with Locations((52.75, 129)):
            Circle(SKETCH022_R)
        with Locations((59.25, 122.5)):
            Circle(SKETCH022_R)
        with Locations((52.75, 116)):
            Circle(SKETCH022_R)
        with Locations((46.25, 122.5)):
            Circle(SKETCH022_R)
    extrude(amount=-POCKET018_DEPTH, mode=Mode.SUBTRACT)

    # Sketch023 → Pocket019 (cut)
    with BuildSketch(Plane.XZ.offset(-29)):
        with Locations((-174.220298, 133.896209)):
            Circle(SKETCH023_R)
        with Locations((-165.353791, 131.470298)):
            Circle(SKETCH023_R)
        with Locations((-167.779702, 122.603791)):
            Circle(SKETCH023_R)
        with Locations((-176.646209, 125.029702)):
            Circle(SKETCH023_R)
    extrude(amount=-POCKET019_DEPTH, mode=Mode.SUBTRACT)


solid = leftshoulder_large_more_holes.part
